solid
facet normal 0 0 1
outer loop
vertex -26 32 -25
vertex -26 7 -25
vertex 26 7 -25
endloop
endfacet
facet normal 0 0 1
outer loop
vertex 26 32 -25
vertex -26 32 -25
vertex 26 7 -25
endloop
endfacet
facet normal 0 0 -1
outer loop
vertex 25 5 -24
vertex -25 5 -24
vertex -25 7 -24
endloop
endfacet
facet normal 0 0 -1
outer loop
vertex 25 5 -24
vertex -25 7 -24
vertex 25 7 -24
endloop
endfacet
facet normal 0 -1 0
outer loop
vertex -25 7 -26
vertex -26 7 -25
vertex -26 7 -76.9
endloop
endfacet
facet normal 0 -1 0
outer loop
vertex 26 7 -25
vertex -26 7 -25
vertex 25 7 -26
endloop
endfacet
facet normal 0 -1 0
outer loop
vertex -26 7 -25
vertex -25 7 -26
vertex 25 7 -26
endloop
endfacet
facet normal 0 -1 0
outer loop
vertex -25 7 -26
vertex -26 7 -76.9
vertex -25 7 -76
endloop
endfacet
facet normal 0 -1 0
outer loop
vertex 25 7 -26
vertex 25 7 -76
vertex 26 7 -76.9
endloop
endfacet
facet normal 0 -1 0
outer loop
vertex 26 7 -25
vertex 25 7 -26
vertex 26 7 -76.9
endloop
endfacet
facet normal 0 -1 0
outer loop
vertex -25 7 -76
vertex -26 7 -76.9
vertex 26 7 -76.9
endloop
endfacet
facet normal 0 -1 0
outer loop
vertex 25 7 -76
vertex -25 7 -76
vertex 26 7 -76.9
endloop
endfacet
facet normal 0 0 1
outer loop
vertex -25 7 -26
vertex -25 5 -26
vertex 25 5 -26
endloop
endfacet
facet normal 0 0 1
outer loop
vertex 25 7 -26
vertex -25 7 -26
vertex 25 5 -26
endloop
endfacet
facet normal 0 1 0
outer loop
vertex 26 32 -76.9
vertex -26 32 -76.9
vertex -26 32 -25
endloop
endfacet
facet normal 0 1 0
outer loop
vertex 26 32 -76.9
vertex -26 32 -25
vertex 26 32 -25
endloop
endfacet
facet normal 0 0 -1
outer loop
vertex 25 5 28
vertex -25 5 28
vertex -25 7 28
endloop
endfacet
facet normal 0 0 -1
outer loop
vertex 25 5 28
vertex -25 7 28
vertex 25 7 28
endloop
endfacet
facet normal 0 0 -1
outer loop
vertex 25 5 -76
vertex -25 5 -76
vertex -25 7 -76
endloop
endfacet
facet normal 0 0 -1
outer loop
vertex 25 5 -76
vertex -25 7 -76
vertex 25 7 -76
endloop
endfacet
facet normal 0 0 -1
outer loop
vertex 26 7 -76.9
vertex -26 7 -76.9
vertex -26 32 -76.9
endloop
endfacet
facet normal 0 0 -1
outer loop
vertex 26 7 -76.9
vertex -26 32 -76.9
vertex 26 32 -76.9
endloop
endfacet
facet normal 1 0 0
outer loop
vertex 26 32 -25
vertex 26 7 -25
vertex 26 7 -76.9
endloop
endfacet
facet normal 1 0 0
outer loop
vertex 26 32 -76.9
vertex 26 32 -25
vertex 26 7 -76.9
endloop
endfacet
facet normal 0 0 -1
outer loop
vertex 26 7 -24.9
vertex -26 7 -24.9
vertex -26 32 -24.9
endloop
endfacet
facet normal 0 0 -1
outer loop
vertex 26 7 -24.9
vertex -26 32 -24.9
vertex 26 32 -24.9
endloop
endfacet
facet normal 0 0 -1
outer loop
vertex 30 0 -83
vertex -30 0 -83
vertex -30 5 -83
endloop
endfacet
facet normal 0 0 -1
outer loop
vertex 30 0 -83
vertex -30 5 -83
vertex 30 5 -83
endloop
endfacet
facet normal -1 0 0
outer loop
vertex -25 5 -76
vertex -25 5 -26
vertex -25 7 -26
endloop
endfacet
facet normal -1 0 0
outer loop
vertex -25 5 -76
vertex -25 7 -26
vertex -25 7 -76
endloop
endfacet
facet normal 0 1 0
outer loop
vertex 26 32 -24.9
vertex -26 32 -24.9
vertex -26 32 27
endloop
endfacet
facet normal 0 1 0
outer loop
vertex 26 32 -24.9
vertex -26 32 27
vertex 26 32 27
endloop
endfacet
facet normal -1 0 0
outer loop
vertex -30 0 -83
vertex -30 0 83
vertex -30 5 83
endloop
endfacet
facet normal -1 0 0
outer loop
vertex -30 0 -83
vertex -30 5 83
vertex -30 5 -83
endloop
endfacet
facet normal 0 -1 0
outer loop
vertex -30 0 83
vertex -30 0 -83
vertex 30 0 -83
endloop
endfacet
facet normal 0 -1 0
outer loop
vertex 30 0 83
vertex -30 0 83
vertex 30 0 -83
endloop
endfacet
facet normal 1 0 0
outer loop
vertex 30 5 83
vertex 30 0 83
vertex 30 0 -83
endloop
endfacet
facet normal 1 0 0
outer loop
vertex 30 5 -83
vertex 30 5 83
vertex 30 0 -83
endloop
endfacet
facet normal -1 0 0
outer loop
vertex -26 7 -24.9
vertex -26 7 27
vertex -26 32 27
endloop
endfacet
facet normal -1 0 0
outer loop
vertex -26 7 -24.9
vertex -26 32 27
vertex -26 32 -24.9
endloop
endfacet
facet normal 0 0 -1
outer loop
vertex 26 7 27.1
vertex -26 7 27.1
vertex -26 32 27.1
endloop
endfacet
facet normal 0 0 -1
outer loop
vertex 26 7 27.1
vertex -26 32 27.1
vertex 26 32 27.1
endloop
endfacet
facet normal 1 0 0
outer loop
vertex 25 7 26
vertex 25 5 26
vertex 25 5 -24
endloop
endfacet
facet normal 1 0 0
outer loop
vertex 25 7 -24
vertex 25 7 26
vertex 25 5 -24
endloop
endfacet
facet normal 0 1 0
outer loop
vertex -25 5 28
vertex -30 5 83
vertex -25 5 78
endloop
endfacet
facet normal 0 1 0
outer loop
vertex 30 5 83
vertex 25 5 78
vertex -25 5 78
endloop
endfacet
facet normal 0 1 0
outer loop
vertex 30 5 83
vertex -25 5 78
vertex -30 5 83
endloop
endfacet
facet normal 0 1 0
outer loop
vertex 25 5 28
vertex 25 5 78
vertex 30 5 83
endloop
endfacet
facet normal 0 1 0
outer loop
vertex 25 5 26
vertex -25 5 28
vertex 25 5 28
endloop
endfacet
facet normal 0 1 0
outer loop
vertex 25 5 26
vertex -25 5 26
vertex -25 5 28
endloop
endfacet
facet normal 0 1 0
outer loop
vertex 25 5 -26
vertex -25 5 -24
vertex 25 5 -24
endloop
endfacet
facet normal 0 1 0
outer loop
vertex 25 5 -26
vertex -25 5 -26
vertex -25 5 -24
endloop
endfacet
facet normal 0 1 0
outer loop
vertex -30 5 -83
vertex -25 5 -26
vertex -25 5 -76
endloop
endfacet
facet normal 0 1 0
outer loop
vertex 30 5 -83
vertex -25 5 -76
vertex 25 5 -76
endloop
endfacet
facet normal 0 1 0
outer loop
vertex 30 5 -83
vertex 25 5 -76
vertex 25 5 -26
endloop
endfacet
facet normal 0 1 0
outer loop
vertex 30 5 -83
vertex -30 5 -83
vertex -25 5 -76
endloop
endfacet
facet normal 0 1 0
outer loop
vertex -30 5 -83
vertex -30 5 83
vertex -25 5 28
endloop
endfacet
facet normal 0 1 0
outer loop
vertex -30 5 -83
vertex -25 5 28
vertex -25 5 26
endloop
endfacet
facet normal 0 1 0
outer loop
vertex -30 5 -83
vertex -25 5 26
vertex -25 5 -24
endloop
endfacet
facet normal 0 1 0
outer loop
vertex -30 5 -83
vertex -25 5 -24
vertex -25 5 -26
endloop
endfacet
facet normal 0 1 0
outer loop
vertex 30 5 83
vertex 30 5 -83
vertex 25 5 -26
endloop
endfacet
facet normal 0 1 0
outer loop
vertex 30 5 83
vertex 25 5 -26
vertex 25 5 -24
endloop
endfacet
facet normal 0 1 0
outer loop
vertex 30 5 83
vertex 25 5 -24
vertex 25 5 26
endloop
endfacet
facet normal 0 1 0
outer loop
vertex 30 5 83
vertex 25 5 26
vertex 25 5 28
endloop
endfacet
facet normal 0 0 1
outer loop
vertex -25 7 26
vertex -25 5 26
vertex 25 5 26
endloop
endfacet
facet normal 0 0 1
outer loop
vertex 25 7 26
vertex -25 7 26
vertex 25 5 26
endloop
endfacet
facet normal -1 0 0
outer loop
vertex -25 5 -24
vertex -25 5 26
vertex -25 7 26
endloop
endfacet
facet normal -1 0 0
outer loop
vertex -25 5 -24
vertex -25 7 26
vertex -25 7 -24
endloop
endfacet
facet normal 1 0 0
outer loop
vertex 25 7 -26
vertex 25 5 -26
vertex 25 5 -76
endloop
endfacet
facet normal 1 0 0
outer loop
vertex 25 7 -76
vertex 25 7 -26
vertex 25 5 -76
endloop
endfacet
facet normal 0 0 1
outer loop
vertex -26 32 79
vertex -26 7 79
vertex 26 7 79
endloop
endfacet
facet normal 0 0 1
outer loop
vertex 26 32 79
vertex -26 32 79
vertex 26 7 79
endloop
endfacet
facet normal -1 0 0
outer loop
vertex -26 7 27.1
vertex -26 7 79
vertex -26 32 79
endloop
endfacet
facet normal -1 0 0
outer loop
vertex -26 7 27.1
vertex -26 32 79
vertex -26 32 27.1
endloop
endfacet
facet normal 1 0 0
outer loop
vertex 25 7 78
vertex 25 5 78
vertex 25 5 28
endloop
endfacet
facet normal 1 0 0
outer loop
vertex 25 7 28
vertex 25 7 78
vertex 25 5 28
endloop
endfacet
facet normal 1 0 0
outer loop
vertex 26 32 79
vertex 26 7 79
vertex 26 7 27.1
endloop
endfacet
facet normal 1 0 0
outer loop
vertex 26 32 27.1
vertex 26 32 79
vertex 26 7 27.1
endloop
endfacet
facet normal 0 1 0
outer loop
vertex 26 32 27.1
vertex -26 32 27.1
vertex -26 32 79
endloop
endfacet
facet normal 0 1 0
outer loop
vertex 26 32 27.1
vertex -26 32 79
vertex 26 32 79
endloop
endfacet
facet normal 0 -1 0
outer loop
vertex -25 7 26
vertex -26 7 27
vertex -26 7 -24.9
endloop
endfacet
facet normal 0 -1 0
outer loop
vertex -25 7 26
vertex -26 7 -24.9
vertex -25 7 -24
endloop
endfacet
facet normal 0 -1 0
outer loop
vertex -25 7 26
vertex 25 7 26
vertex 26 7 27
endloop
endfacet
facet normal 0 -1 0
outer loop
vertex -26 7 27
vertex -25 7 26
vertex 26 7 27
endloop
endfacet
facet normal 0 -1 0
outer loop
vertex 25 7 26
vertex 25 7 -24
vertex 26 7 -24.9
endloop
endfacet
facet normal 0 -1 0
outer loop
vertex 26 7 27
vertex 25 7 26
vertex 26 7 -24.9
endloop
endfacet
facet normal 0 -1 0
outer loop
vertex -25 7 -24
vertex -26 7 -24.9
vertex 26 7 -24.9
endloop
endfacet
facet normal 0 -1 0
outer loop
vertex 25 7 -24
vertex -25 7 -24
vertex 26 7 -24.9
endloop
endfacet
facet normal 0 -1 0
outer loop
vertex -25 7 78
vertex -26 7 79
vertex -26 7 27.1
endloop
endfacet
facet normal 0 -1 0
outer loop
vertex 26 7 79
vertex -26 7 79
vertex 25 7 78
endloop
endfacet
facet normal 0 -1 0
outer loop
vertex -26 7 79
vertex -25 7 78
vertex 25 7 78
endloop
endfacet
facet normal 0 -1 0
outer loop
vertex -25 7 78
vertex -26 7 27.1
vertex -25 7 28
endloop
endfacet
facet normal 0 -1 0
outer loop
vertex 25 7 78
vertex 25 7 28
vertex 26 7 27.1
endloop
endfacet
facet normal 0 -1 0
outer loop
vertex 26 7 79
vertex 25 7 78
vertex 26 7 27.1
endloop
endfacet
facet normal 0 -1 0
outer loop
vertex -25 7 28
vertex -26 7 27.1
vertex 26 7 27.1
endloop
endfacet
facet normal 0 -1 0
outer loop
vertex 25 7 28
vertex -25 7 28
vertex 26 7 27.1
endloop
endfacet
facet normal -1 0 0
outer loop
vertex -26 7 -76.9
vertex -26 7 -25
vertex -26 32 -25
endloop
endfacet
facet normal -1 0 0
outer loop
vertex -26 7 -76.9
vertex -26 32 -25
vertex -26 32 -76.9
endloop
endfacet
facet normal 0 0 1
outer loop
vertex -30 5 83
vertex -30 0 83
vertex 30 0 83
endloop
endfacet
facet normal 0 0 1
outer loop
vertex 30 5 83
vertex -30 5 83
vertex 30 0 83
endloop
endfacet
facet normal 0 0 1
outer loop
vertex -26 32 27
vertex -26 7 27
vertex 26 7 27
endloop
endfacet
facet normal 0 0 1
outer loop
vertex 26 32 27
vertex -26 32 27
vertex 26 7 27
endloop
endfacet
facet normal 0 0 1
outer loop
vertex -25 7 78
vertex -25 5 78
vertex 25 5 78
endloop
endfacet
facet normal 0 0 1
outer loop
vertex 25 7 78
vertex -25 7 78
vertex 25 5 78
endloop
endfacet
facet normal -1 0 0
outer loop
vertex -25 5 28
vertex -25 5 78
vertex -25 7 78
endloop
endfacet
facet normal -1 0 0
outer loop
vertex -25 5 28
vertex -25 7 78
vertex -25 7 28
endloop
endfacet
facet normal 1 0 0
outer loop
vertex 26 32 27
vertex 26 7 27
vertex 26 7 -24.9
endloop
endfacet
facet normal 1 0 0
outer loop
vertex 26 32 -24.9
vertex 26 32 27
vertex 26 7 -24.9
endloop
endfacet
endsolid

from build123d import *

# Parameters (mm, degrees)
SKETCH1_W           = 60
SKETCH1_H           = 166
BOSS_EXTRUDE1_DEPTH = 5
SKETCH2_W           = 50
SKETCH2_H           = 50
BOSS_EXTRUDE3_DEPTH = 2
LPATTERN1_COUNT     = 3
LPATTERN1_PITCH     = 52
SKETCH3_W           = 52
SKETCH3_H           = 51.9
BOSS_EXTRUDE8_DEPTH = 25
LPATTERN5_COUNT     = 3
LPATTERN5_PITCH     = 52


with BuildPart() as part:
    # Sketch1 → Boss-Extrude1 (new body)
    with BuildSketch(Plane(origin=(0, 0, 0), x_dir=(1, 0, 0), z_dir=(0, 1, 0))):
        Rectangle(SKETCH1_W, SKETCH1_H)
    extrude(amount=BOSS_EXTRUDE1_DEPTH)

    # Sketch2 → Boss-Extrude3 (add)
    with BuildSketch(Plane(origin=(0, 5, 0), x_dir=(1, 0, 0), z_dir=(0, 1, 0))):
        with Locations((0, -53)):
            Rectangle(SKETCH2_W, SKETCH2_H)
    boss_extrude3 = extrude(amount=BOSS_EXTRUDE3_DEPTH)

    # LPattern1: Boss-Extrude3 ×3
    with Locations(*[(0, 0, -i * LPATTERN1_PITCH) for i in range(1, LPATTERN1_COUNT)]):
        add(boss_extrude3)

    # Sketch3 → Boss-Extrude8 (add)
    with BuildSketch(Plane(origin=(0, 7, 0), x_dir=(1, 0, 0), z_dir=(0, 1, 0))):
        with Locations((0, -53.05)):
            Rectangle(SKETCH3_W, SKETCH3_H)
    boss_extrude8 = extrude(amount=BOSS_EXTRUDE8_DEPTH)

    # LPattern5: Boss-Extrude8 ×3
    with Locations(*[(0, 0, -i * LPATTERN5_PITCH) for i in range(1, LPATTERN5_COUNT)]):
        add(boss_extrude8)


solid = part.part
